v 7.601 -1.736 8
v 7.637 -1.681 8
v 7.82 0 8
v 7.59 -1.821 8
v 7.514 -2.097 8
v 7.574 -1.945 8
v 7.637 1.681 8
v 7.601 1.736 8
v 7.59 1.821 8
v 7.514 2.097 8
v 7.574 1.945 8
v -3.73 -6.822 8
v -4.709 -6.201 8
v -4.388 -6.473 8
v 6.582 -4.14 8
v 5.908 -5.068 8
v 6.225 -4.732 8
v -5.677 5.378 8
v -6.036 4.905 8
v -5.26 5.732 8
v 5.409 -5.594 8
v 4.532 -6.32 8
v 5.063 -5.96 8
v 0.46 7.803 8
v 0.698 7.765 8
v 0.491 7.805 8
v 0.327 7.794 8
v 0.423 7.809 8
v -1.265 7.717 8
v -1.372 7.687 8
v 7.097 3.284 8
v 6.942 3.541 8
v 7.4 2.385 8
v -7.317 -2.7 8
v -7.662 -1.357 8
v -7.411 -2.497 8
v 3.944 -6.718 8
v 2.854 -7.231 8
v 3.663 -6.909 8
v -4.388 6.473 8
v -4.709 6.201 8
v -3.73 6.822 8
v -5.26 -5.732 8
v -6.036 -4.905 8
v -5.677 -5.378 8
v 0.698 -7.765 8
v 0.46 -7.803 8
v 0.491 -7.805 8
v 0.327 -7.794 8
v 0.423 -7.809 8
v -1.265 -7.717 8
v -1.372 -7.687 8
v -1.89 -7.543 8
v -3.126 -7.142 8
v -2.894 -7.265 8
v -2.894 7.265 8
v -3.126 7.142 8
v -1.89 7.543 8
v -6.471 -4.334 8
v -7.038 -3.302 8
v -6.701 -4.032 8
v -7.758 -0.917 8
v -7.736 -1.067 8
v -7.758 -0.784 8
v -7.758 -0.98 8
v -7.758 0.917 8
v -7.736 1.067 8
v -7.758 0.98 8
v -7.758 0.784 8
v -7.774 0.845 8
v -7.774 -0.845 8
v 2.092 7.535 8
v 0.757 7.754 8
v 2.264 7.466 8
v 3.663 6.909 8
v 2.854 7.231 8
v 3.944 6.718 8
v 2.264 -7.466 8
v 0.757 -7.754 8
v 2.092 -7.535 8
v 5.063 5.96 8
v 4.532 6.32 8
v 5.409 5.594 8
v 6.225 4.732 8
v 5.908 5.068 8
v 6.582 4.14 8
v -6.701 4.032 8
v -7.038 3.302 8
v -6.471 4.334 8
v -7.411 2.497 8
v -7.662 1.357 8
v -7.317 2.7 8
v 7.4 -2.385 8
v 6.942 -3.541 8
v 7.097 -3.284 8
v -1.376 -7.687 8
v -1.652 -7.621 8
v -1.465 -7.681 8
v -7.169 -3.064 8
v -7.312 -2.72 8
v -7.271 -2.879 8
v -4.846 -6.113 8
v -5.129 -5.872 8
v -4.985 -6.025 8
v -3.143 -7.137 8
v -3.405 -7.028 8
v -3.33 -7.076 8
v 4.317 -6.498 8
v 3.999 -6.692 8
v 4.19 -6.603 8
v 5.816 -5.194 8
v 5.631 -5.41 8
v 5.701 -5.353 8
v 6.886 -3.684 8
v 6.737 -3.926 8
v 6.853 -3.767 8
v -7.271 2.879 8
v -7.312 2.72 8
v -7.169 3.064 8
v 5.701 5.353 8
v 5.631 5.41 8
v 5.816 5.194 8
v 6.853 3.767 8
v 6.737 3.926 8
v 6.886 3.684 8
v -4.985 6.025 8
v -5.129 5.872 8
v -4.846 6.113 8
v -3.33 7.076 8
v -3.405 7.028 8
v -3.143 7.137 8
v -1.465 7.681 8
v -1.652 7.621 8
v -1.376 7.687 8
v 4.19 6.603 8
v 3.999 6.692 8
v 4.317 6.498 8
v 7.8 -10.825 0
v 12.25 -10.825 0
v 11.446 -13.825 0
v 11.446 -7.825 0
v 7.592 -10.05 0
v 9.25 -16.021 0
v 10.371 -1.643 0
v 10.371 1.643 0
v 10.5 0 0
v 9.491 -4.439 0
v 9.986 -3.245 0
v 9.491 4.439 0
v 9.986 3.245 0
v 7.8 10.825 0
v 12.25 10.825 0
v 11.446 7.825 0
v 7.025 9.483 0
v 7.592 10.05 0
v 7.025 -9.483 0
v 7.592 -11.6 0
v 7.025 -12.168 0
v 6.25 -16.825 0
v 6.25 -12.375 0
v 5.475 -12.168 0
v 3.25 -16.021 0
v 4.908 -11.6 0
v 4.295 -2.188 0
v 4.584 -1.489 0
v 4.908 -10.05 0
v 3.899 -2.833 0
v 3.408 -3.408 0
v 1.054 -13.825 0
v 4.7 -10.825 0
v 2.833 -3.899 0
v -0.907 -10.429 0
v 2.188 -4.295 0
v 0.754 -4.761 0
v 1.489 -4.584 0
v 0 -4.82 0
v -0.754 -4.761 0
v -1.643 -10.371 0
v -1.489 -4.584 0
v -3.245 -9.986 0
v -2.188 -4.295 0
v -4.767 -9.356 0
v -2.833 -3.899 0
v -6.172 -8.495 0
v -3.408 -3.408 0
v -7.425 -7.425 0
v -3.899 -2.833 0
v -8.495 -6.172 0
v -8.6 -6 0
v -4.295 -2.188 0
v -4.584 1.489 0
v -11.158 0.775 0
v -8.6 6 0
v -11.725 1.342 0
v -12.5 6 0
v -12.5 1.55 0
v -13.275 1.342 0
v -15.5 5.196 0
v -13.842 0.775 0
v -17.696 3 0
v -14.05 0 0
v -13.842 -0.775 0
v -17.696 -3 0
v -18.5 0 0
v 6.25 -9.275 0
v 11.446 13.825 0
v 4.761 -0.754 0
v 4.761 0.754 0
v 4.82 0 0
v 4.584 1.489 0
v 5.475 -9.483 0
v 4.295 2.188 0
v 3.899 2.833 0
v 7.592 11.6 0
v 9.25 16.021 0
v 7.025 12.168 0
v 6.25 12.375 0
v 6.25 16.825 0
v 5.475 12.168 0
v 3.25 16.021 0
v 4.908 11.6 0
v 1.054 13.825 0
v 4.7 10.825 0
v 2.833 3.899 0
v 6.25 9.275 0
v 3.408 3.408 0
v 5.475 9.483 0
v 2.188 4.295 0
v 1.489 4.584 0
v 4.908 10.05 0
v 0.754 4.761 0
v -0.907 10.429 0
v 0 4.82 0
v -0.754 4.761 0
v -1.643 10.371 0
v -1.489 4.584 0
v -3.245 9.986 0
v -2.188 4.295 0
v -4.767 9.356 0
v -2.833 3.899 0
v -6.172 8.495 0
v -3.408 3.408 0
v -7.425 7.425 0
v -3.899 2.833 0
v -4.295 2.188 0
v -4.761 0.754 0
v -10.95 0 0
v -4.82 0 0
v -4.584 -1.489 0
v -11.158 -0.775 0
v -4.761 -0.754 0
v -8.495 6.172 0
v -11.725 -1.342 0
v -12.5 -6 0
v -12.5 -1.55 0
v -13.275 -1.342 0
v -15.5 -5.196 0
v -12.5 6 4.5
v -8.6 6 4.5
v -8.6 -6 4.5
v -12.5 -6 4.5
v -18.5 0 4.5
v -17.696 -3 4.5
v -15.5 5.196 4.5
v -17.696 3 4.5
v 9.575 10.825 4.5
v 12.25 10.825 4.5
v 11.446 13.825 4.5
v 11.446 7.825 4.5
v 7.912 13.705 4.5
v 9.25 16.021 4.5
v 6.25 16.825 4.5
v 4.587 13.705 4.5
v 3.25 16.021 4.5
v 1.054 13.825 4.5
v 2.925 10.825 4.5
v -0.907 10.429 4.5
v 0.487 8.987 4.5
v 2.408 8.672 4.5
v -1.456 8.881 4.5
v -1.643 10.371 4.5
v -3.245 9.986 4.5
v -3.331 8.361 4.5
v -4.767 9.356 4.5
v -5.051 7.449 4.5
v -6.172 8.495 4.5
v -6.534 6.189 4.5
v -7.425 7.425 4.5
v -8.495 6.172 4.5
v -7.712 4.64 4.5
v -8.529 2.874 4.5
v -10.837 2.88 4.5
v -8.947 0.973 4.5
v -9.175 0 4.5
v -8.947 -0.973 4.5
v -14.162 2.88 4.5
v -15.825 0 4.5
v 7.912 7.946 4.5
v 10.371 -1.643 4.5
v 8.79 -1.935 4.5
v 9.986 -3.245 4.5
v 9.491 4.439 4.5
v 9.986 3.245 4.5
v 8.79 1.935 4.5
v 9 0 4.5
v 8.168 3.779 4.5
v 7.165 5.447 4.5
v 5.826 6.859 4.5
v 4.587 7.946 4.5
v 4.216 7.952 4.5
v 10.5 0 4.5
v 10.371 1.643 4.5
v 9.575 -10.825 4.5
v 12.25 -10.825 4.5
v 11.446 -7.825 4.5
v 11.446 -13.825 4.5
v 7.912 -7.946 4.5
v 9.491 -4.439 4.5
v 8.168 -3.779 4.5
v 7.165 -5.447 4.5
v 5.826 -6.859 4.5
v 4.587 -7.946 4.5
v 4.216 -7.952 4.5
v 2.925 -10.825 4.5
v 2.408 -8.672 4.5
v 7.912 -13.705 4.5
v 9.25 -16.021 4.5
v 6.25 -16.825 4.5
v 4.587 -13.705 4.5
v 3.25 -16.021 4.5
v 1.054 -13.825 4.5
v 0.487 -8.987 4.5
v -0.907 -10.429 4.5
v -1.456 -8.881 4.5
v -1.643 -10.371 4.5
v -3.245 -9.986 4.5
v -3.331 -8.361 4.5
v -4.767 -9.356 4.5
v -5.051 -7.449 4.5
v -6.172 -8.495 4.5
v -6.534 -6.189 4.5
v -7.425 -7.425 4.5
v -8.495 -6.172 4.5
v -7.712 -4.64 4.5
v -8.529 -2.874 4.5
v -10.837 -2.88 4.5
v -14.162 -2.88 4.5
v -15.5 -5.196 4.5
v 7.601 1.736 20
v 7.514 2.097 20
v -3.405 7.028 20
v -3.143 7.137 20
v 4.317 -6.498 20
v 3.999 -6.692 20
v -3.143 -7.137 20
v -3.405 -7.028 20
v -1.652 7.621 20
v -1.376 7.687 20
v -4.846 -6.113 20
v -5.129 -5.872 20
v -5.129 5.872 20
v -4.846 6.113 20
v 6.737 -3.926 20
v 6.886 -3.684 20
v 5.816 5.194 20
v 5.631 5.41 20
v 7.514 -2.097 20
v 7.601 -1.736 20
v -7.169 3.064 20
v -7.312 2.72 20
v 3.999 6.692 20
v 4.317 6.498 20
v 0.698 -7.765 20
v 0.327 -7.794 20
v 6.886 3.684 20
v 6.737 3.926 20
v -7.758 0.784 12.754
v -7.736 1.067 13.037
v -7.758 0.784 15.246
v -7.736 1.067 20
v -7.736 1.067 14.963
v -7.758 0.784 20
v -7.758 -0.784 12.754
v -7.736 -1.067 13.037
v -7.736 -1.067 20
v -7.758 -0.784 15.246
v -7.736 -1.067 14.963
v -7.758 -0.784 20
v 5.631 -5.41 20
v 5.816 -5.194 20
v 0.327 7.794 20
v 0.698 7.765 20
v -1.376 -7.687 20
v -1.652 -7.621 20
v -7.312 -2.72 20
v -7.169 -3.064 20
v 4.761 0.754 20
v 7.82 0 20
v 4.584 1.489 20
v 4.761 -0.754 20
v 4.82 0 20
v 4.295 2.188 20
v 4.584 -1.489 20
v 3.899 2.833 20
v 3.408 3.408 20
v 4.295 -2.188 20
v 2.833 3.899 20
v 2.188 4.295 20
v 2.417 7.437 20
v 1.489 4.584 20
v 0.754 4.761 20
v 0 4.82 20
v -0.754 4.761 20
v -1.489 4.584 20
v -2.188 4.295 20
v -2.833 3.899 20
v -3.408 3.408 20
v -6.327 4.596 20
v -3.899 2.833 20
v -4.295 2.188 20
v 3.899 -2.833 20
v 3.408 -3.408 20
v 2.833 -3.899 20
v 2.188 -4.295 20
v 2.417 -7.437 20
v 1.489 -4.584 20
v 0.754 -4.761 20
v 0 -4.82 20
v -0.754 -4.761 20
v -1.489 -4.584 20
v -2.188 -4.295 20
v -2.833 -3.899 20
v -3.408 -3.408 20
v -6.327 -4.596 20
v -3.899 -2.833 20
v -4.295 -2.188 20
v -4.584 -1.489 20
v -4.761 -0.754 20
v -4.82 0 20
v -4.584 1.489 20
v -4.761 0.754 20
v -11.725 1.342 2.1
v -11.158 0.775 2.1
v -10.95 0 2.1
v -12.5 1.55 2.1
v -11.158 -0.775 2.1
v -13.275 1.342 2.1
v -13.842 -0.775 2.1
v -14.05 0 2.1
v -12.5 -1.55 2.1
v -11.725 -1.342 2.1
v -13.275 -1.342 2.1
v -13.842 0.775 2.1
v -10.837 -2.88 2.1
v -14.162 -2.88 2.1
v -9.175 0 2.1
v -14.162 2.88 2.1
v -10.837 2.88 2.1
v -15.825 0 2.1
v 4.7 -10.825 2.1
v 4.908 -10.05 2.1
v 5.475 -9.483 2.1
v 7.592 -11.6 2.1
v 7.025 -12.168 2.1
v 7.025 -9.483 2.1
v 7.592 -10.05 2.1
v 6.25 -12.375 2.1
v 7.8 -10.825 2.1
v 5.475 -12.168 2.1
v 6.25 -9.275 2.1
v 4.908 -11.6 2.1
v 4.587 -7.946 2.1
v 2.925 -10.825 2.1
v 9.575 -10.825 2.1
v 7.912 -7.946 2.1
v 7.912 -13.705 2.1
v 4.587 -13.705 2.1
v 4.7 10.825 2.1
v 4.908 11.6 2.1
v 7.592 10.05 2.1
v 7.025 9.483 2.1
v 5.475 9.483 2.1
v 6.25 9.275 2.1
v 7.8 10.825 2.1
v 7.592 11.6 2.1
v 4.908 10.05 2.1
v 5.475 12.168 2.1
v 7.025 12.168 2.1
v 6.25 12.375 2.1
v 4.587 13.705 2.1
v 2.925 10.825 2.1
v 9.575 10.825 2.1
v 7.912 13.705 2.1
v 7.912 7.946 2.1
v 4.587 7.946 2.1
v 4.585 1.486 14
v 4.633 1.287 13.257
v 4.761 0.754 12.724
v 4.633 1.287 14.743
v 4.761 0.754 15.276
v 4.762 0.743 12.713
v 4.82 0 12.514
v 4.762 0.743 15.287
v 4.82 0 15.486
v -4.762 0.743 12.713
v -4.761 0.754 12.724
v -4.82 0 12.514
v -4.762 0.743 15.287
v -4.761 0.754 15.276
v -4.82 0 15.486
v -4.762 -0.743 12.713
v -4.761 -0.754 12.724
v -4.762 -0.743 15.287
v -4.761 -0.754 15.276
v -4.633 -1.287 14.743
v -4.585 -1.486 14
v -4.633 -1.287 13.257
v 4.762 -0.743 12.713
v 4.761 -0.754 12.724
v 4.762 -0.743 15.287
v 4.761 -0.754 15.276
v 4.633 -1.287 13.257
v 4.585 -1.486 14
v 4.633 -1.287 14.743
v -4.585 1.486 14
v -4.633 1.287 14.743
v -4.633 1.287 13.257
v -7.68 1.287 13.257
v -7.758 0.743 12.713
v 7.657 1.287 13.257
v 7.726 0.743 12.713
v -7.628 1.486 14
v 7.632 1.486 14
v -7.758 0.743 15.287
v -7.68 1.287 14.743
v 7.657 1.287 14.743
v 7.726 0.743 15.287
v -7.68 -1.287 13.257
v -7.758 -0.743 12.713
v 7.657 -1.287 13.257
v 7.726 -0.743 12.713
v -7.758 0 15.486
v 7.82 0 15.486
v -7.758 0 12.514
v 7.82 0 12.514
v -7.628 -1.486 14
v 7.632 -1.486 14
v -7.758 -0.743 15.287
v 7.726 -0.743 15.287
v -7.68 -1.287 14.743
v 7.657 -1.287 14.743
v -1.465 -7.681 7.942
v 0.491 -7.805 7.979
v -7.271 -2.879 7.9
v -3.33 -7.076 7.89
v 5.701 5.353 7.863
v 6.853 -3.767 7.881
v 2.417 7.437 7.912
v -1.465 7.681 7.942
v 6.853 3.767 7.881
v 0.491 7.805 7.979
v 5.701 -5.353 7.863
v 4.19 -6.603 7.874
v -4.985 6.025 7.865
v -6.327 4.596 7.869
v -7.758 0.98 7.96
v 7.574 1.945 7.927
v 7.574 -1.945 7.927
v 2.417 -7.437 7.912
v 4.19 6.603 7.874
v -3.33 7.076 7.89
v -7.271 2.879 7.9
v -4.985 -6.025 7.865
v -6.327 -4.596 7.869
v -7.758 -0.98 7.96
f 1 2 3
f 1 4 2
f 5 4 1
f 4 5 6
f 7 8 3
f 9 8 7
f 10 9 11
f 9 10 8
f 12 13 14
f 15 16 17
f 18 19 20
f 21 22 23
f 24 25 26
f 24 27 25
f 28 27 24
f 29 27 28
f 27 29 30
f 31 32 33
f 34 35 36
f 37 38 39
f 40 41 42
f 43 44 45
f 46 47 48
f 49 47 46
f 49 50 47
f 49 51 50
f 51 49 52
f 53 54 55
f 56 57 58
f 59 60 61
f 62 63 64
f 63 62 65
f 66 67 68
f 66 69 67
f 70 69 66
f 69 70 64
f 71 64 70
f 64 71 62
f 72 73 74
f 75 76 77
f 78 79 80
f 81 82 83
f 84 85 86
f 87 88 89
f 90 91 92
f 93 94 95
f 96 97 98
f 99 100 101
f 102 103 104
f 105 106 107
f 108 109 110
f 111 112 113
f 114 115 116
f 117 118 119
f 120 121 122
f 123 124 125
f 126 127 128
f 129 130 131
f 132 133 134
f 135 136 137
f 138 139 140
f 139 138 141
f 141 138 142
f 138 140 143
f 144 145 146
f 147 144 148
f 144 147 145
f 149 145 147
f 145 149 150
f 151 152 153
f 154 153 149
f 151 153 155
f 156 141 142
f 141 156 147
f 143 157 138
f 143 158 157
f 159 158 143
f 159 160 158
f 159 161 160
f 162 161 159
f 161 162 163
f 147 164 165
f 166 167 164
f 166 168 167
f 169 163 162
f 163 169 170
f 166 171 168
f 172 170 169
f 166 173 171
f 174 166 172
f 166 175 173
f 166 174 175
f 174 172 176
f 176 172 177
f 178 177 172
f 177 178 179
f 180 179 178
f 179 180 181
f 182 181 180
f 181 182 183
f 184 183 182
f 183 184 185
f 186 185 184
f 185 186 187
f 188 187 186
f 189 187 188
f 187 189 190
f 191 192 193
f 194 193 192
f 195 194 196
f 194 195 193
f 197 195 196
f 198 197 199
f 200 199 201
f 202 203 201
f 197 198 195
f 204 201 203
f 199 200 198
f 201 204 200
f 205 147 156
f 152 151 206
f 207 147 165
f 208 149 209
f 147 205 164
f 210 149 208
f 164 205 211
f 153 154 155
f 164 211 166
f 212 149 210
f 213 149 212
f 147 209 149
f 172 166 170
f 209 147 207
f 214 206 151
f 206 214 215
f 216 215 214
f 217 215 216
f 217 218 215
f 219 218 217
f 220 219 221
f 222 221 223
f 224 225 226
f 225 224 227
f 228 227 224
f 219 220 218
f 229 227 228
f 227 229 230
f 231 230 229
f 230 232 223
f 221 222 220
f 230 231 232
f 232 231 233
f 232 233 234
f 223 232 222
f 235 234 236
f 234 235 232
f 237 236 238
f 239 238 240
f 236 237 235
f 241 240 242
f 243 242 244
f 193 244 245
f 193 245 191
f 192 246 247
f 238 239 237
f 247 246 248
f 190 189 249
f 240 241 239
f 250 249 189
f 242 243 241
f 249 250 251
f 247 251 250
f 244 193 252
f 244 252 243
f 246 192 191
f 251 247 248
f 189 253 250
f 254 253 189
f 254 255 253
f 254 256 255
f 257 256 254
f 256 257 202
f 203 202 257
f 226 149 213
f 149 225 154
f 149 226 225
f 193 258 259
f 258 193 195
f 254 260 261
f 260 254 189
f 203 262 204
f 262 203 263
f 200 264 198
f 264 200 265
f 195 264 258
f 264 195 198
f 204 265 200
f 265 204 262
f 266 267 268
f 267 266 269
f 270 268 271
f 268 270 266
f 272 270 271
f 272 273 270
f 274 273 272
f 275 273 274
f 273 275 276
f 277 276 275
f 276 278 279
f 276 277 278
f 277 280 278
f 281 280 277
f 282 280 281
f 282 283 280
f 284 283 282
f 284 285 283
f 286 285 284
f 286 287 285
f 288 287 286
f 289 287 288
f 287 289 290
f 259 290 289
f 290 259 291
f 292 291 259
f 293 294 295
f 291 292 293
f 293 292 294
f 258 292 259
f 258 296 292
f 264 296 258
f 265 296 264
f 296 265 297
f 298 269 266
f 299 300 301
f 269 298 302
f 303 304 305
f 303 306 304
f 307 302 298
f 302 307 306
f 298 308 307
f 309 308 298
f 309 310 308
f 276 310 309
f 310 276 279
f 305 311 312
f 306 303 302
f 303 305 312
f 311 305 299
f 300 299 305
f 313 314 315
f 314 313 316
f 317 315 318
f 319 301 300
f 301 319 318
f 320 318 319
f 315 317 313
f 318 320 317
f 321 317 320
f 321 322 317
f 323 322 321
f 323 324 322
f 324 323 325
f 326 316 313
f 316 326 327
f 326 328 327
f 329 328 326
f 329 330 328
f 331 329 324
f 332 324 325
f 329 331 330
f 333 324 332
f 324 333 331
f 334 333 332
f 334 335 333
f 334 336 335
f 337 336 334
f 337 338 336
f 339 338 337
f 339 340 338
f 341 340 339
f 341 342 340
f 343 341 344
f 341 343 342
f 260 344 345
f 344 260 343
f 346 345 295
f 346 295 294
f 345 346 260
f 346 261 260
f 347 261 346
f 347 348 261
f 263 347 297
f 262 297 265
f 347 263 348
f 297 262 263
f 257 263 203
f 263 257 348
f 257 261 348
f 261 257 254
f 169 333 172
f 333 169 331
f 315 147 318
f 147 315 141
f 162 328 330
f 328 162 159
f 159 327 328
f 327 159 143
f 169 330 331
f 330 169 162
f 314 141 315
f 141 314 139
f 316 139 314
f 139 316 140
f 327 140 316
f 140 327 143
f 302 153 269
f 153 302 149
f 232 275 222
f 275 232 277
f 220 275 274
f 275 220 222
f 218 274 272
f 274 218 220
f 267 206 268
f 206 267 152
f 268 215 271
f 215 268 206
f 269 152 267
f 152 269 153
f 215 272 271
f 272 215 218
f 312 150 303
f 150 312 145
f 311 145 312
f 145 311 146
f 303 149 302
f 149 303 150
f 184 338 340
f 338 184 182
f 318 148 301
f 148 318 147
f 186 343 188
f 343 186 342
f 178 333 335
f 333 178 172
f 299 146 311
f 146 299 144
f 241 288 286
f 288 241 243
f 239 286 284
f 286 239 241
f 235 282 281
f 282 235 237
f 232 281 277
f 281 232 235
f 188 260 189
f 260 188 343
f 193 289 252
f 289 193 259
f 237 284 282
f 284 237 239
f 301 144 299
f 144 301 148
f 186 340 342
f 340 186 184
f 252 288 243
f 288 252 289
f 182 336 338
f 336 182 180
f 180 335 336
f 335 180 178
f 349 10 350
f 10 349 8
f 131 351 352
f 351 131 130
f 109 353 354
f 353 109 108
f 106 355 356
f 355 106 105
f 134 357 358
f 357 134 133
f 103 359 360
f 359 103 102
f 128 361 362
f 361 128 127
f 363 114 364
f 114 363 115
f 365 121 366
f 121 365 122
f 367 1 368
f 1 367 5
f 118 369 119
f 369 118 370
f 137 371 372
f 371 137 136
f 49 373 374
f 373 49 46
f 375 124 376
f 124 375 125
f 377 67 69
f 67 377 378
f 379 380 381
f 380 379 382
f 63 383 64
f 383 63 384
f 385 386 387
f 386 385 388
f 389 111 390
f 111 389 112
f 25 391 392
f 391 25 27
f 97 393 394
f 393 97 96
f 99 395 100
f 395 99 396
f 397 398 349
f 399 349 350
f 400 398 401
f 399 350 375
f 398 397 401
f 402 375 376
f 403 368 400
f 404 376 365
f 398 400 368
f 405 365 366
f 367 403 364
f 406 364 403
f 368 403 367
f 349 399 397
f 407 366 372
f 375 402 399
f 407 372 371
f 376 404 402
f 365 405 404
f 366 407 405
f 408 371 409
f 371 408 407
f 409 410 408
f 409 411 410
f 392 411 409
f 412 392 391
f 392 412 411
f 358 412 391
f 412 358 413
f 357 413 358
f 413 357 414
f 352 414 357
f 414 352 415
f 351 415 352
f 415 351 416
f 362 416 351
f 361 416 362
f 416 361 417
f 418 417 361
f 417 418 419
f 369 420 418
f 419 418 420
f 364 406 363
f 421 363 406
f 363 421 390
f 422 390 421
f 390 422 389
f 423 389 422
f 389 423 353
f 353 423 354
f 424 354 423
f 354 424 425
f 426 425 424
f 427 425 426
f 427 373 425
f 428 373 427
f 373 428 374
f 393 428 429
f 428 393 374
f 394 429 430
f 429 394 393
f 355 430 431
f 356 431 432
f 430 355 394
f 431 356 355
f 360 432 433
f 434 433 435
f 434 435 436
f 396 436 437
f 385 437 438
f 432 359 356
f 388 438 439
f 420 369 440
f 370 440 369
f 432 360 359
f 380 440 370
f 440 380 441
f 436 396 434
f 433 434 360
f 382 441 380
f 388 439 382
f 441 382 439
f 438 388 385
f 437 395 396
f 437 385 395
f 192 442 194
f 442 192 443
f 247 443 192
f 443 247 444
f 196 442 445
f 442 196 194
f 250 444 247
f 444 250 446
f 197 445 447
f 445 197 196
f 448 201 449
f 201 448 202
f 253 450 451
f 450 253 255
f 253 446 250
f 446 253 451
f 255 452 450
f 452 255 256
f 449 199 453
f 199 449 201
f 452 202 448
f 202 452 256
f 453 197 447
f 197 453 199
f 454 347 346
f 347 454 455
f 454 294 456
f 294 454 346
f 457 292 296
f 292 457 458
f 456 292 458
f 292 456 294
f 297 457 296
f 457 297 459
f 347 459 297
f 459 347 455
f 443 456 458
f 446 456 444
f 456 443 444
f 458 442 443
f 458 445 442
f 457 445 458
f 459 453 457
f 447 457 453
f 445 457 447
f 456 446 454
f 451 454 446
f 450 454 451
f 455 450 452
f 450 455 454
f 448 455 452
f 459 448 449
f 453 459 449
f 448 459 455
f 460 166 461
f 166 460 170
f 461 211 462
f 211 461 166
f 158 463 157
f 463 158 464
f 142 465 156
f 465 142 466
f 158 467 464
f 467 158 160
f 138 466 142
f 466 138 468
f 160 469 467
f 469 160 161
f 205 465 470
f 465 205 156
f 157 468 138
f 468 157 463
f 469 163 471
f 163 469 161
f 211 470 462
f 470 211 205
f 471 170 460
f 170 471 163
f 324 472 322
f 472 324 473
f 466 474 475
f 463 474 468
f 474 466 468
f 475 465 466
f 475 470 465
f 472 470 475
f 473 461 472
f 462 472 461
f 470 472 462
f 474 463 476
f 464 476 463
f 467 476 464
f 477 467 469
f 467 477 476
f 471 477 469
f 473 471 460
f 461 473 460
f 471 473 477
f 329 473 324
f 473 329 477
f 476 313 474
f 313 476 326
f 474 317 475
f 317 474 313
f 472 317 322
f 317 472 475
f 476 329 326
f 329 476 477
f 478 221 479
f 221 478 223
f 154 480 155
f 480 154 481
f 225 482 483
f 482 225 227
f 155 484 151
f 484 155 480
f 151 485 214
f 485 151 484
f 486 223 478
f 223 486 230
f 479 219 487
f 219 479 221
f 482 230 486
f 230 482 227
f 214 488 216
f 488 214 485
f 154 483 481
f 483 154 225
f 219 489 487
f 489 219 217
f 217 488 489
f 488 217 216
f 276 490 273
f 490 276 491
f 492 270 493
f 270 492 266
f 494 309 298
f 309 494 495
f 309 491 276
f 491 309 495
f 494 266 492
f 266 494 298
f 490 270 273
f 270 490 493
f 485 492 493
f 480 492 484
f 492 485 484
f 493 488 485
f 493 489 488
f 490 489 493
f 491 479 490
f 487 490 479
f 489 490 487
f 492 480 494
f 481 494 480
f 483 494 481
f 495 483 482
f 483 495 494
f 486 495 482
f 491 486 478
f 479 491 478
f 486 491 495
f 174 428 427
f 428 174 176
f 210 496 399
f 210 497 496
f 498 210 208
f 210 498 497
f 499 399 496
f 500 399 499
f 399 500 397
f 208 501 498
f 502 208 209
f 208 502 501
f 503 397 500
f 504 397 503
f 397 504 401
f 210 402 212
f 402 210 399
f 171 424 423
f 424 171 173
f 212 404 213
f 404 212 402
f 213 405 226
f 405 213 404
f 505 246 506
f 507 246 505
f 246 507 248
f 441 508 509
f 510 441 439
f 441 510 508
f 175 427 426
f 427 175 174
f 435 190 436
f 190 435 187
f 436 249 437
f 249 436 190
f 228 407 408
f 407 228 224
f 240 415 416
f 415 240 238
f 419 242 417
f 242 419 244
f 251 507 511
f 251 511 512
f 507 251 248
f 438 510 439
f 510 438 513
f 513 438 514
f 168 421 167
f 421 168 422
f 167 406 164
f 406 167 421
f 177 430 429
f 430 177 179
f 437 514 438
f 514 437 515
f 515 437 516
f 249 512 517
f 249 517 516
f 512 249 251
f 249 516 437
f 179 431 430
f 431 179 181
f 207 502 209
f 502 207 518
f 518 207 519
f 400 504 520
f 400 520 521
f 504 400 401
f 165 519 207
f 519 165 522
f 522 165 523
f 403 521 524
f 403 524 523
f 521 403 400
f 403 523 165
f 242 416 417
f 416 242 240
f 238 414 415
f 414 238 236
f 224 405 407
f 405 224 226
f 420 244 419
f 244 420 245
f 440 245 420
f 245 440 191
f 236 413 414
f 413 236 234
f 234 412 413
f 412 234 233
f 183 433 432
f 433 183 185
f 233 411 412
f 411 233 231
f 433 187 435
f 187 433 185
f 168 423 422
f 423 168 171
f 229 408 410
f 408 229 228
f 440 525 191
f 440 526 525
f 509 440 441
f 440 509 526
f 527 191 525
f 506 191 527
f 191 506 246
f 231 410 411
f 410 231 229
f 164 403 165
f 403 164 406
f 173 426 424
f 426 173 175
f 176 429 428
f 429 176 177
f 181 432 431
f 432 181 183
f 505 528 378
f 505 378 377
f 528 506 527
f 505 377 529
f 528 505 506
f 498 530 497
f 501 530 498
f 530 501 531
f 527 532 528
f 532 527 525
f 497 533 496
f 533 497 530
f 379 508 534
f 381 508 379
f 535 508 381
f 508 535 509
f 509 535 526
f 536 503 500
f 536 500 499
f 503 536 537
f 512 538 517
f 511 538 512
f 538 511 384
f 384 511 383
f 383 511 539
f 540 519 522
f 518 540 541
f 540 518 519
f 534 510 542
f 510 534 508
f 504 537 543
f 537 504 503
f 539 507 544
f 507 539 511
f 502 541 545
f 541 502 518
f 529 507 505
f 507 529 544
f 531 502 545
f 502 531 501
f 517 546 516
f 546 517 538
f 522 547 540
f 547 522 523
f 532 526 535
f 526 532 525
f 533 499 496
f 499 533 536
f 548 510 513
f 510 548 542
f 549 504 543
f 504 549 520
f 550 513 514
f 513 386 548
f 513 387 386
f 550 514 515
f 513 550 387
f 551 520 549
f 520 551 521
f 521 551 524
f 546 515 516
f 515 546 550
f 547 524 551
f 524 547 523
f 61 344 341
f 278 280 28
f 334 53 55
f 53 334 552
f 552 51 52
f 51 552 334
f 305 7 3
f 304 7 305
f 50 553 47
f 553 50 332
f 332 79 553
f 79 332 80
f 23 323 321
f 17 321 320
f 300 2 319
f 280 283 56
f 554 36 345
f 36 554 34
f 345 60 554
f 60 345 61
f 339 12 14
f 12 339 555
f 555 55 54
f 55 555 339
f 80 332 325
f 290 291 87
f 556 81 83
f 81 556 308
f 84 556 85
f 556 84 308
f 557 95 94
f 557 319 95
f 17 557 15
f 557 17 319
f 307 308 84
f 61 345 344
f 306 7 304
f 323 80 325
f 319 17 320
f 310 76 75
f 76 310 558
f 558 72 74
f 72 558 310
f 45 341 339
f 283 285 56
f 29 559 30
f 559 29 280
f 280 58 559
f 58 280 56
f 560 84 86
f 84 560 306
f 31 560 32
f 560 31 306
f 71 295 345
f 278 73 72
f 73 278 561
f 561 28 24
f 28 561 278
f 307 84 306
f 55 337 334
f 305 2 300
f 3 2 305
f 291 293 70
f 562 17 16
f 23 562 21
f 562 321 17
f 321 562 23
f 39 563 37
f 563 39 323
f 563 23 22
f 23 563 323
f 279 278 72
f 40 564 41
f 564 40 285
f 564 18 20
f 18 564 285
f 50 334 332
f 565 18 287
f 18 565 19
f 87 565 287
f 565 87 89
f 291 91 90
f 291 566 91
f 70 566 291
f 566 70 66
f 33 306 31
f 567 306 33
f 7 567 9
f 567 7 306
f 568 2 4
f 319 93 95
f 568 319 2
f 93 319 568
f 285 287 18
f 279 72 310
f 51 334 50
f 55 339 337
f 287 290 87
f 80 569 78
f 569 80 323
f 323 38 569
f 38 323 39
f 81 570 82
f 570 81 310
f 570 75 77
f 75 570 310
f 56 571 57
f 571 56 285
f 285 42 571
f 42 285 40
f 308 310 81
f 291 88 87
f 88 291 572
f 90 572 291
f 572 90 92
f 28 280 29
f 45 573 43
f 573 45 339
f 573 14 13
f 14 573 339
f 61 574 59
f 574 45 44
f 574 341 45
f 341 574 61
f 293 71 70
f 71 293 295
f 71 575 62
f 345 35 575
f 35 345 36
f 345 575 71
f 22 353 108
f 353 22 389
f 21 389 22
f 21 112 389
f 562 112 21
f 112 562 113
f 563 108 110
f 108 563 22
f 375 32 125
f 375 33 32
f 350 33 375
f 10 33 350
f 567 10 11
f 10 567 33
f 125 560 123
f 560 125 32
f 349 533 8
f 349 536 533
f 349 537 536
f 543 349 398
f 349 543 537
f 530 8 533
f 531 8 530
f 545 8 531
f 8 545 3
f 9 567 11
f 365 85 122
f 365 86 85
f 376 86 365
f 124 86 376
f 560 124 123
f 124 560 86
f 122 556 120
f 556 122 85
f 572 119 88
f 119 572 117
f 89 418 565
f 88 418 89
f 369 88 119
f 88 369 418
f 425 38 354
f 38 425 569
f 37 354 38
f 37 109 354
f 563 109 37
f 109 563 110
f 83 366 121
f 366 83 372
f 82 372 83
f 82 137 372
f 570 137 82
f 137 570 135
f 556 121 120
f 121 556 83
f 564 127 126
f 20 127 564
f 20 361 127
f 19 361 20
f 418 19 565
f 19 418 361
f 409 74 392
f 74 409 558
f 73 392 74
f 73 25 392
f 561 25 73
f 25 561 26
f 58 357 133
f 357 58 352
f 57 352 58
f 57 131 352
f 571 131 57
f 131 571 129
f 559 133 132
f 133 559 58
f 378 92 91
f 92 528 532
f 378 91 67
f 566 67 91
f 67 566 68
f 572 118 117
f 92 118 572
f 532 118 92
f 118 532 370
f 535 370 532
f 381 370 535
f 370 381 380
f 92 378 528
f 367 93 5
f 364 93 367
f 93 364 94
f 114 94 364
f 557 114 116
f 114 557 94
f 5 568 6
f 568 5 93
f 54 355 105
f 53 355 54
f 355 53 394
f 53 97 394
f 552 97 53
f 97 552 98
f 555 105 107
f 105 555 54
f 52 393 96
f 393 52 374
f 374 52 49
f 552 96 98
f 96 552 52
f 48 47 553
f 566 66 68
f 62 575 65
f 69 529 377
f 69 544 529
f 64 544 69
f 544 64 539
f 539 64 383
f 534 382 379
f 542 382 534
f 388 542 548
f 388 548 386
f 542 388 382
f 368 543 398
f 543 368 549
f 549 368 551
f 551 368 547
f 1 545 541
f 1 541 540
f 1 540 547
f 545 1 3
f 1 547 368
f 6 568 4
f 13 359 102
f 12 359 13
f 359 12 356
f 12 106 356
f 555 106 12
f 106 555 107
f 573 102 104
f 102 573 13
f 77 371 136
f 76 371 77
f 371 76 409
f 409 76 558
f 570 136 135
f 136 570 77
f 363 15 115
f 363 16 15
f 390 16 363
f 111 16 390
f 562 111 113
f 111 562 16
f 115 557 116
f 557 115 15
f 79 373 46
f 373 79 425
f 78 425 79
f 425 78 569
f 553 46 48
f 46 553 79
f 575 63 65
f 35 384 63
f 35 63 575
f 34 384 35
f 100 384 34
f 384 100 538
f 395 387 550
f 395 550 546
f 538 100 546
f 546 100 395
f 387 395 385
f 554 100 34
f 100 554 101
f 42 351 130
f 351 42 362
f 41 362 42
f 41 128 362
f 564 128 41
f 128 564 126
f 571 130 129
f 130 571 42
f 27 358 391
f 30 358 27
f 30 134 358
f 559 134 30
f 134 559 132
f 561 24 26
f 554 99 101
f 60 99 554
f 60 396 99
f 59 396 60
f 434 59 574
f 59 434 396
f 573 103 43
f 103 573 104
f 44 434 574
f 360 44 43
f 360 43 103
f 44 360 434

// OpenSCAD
thickness = 4.5;
dti_holder_height = 20;
dti_dia = 9.54 + 0.1;
dti_holder_thickness = 3;
delta = 0.01;
arms = 3;
arm_height = 8;
spacing = 25;
arm_width = 12;
m3_dia = 3.1;
m3_nut_dia = 6.2 + 0.45; // for m3 screw - this is the dist across corners.
m3_clearance_dia = 7;
m3_nut_thickness = 2.4;
screw_dia_tighten = 0.01; // in inches
screw_dia = (.107 + screw_dia_tighten) * 25.4; // set to tap size.  Here: 6-32 tap drill size.  // Was: 2.4mm for m3.
main_cyl_dia = 21;

intersection() {
	difference() {
		union() {
			// main body
			cylinder(r=main_cyl_dia/2, h=arm_height, $fn=40);
			// boss for dti
			cylinder(r=dti_dia/2 + dti_holder_thickness, h=dti_holder_height, $fn=40);
			for (i =[0:360/arms:359]) {
				// Arms
				rotate([0, 0, i]) translate([-spacing/4, 0, arm_height/2]) cube([spacing/2, arm_width, arm_height], center=true);
				// Rounded ends of arms
				rotate([0, 0, i]) translate([-spacing/2, 0, 0]) cylinder(r=arm_width/2, h=thickness, $fn=12);
			}
		}
		for (i =[0:360/arms:359]) {
			// m3 holes
			rotate([0, 0, i]) translate([-spacing/2, 0, -delta]) cylinder(r=m3_dia/2, h=thickness + 2 * delta, $fn=12);
			// nut holes
			rotate([0, 0, i]) translate([-spacing/2, 0, thickness - m3_nut_thickness]) cylinder(r=m3_nut_dia/2, h=m3_nut_thickness + delta, $fn=6);
		}
		// Hole for DTI
		translate([0, 0, -delta]) cylinder(r=dti_dia/2, h=dti_holder_height + 2 * delta, $fn=40);
		// Hole for screw to secure DTI
		translate([0, 0, (arm_height + dti_holder_height)/2]) rotate([-90, 0, 90]) cylinder(r=screw_dia/2, h = spacing * 2, center=true, $fn=12);
	}
	// Bounding shape
	union() {
		// Cutout to get angled arms
		translate([0, 0, thickness]) cylinder(r1=spacing/2 - m3_clearance_dia/2, r2 = dti_dia/2 + dti_holder_thickness, h=arm_height - thickness);
		cylinder(r=dti_holder_thickness + dti_dia/2, h=dti_holder_height + delta);
		cylinder(r=spacing/2 + 10, h=thickness);
	}
}
